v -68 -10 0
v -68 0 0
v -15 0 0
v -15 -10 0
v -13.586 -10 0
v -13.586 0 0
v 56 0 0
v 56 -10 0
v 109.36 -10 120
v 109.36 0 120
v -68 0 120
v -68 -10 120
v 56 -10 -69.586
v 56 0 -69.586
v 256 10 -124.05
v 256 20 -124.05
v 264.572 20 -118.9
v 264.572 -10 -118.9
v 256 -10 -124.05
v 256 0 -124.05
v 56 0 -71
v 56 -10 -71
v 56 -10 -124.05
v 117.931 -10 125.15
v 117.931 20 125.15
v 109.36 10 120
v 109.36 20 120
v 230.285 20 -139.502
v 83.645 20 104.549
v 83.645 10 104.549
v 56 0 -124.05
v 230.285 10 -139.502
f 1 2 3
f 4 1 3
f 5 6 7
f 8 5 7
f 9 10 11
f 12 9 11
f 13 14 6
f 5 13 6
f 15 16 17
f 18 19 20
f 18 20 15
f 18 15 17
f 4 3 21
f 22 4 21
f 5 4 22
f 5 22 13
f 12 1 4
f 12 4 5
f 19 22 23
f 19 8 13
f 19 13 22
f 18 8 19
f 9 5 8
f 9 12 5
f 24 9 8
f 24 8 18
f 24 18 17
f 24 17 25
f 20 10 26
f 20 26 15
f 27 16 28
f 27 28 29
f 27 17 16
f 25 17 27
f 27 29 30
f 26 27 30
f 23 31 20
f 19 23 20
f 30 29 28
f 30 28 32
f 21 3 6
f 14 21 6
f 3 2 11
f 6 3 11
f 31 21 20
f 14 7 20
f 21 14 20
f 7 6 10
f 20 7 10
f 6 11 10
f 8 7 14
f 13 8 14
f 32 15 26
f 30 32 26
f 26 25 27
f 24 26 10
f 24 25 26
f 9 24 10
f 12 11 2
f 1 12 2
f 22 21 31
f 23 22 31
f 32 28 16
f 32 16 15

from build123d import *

# Parameters (mm, degrees)
F1_DEPTH = 10
F3_DEPTH = 30
F4_W     = 10
F4_H     = 284.7173312026
F5_DEPTH = 30


with BuildPart() as f1:
    # F0 (on Front) → F1 (new body)
    with BuildSketch(Plane.XZ):
        Polygon((-68, 120), (-68, 0), (-15, 0), (-40, 25), (-39.2928932188, 25.7071067812), (-13.5857864376, 0), (56, 0), (56, -69.5857864376), (85.8867522003, -99.4725386379), (85.1796454191, -100.1796454191), (56, -71), (56, -124.05038625), (256, -124.05038625), (109.3597338439, 120), align=None)
        Polygon((-40, 25), (-15, 0), (-13.5857864376, 0), (-39.2928932188, 25.7071067812), align=None)
        Polygon((-13.5857864376, 0), (-15, 0), (56, -71), (56, -69.5857864376), align=None)
        Polygon((56, -69.5857864376), (56, -71), (85.1796454191, -100.1796454191), (85.8867522003, -99.4725386379), align=None)
    extrude(amount=F1_DEPTH)

    # F2 (on face) → F3 (join)
    with BuildSketch(Plane.XZ.offset(10)):
        Polygon((117.9314068509, 125.1503807491), (109.3597338439, 120), (256, -124.05038625), (264.571673007, -118.9000055009), align=None)
    extrude(amount=-F3_DEPTH)

    # F4 (on face) → F5 (join)
    with BuildSketch(Plane(origin=(133.3273650703, 0, 80.1111631094), x_dir=(0, -1, 0), z_dir=(-0.8571673007, 0, -0.5150380749))):
        with Locations((-15, -95.8230163087)):
            Rectangle(F4_W, F4_H)
    extrude(amount=F5_DEPTH)


solid = f1.part
